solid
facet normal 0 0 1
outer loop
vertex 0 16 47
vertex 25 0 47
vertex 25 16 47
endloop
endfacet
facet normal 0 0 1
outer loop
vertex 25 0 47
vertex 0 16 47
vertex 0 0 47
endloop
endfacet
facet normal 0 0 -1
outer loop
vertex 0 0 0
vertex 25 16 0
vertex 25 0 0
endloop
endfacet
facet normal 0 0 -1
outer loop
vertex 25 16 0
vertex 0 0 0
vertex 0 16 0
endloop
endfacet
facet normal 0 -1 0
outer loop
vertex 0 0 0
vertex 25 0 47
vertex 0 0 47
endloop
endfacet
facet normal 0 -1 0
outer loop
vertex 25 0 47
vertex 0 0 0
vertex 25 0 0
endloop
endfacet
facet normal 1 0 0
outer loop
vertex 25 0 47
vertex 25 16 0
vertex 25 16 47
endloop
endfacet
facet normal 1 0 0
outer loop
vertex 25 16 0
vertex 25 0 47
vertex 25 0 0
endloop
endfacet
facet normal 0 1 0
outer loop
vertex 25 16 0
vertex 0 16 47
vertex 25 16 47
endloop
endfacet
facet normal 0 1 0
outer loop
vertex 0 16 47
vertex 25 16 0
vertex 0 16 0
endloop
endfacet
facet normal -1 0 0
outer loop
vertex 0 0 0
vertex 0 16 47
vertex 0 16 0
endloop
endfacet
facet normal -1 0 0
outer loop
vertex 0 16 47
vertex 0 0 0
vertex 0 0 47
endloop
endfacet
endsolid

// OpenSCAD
/**
 * 9 Volt Battery
 */

// battery
battery_width = 25;
battery_length = 16;
battery_height = 47;

// connector
battery_connector_height = 4;

// clearance values
battery_total_height = battery_height + battery_connector_height;

/**
 * Battery
 */
module battery() {
    color("silver")
    cube([battery_width, battery_length, battery_height]);
}

/**
 * Preview
 */
battery_preview = true;
if (battery_preview) {
    battery();
}
